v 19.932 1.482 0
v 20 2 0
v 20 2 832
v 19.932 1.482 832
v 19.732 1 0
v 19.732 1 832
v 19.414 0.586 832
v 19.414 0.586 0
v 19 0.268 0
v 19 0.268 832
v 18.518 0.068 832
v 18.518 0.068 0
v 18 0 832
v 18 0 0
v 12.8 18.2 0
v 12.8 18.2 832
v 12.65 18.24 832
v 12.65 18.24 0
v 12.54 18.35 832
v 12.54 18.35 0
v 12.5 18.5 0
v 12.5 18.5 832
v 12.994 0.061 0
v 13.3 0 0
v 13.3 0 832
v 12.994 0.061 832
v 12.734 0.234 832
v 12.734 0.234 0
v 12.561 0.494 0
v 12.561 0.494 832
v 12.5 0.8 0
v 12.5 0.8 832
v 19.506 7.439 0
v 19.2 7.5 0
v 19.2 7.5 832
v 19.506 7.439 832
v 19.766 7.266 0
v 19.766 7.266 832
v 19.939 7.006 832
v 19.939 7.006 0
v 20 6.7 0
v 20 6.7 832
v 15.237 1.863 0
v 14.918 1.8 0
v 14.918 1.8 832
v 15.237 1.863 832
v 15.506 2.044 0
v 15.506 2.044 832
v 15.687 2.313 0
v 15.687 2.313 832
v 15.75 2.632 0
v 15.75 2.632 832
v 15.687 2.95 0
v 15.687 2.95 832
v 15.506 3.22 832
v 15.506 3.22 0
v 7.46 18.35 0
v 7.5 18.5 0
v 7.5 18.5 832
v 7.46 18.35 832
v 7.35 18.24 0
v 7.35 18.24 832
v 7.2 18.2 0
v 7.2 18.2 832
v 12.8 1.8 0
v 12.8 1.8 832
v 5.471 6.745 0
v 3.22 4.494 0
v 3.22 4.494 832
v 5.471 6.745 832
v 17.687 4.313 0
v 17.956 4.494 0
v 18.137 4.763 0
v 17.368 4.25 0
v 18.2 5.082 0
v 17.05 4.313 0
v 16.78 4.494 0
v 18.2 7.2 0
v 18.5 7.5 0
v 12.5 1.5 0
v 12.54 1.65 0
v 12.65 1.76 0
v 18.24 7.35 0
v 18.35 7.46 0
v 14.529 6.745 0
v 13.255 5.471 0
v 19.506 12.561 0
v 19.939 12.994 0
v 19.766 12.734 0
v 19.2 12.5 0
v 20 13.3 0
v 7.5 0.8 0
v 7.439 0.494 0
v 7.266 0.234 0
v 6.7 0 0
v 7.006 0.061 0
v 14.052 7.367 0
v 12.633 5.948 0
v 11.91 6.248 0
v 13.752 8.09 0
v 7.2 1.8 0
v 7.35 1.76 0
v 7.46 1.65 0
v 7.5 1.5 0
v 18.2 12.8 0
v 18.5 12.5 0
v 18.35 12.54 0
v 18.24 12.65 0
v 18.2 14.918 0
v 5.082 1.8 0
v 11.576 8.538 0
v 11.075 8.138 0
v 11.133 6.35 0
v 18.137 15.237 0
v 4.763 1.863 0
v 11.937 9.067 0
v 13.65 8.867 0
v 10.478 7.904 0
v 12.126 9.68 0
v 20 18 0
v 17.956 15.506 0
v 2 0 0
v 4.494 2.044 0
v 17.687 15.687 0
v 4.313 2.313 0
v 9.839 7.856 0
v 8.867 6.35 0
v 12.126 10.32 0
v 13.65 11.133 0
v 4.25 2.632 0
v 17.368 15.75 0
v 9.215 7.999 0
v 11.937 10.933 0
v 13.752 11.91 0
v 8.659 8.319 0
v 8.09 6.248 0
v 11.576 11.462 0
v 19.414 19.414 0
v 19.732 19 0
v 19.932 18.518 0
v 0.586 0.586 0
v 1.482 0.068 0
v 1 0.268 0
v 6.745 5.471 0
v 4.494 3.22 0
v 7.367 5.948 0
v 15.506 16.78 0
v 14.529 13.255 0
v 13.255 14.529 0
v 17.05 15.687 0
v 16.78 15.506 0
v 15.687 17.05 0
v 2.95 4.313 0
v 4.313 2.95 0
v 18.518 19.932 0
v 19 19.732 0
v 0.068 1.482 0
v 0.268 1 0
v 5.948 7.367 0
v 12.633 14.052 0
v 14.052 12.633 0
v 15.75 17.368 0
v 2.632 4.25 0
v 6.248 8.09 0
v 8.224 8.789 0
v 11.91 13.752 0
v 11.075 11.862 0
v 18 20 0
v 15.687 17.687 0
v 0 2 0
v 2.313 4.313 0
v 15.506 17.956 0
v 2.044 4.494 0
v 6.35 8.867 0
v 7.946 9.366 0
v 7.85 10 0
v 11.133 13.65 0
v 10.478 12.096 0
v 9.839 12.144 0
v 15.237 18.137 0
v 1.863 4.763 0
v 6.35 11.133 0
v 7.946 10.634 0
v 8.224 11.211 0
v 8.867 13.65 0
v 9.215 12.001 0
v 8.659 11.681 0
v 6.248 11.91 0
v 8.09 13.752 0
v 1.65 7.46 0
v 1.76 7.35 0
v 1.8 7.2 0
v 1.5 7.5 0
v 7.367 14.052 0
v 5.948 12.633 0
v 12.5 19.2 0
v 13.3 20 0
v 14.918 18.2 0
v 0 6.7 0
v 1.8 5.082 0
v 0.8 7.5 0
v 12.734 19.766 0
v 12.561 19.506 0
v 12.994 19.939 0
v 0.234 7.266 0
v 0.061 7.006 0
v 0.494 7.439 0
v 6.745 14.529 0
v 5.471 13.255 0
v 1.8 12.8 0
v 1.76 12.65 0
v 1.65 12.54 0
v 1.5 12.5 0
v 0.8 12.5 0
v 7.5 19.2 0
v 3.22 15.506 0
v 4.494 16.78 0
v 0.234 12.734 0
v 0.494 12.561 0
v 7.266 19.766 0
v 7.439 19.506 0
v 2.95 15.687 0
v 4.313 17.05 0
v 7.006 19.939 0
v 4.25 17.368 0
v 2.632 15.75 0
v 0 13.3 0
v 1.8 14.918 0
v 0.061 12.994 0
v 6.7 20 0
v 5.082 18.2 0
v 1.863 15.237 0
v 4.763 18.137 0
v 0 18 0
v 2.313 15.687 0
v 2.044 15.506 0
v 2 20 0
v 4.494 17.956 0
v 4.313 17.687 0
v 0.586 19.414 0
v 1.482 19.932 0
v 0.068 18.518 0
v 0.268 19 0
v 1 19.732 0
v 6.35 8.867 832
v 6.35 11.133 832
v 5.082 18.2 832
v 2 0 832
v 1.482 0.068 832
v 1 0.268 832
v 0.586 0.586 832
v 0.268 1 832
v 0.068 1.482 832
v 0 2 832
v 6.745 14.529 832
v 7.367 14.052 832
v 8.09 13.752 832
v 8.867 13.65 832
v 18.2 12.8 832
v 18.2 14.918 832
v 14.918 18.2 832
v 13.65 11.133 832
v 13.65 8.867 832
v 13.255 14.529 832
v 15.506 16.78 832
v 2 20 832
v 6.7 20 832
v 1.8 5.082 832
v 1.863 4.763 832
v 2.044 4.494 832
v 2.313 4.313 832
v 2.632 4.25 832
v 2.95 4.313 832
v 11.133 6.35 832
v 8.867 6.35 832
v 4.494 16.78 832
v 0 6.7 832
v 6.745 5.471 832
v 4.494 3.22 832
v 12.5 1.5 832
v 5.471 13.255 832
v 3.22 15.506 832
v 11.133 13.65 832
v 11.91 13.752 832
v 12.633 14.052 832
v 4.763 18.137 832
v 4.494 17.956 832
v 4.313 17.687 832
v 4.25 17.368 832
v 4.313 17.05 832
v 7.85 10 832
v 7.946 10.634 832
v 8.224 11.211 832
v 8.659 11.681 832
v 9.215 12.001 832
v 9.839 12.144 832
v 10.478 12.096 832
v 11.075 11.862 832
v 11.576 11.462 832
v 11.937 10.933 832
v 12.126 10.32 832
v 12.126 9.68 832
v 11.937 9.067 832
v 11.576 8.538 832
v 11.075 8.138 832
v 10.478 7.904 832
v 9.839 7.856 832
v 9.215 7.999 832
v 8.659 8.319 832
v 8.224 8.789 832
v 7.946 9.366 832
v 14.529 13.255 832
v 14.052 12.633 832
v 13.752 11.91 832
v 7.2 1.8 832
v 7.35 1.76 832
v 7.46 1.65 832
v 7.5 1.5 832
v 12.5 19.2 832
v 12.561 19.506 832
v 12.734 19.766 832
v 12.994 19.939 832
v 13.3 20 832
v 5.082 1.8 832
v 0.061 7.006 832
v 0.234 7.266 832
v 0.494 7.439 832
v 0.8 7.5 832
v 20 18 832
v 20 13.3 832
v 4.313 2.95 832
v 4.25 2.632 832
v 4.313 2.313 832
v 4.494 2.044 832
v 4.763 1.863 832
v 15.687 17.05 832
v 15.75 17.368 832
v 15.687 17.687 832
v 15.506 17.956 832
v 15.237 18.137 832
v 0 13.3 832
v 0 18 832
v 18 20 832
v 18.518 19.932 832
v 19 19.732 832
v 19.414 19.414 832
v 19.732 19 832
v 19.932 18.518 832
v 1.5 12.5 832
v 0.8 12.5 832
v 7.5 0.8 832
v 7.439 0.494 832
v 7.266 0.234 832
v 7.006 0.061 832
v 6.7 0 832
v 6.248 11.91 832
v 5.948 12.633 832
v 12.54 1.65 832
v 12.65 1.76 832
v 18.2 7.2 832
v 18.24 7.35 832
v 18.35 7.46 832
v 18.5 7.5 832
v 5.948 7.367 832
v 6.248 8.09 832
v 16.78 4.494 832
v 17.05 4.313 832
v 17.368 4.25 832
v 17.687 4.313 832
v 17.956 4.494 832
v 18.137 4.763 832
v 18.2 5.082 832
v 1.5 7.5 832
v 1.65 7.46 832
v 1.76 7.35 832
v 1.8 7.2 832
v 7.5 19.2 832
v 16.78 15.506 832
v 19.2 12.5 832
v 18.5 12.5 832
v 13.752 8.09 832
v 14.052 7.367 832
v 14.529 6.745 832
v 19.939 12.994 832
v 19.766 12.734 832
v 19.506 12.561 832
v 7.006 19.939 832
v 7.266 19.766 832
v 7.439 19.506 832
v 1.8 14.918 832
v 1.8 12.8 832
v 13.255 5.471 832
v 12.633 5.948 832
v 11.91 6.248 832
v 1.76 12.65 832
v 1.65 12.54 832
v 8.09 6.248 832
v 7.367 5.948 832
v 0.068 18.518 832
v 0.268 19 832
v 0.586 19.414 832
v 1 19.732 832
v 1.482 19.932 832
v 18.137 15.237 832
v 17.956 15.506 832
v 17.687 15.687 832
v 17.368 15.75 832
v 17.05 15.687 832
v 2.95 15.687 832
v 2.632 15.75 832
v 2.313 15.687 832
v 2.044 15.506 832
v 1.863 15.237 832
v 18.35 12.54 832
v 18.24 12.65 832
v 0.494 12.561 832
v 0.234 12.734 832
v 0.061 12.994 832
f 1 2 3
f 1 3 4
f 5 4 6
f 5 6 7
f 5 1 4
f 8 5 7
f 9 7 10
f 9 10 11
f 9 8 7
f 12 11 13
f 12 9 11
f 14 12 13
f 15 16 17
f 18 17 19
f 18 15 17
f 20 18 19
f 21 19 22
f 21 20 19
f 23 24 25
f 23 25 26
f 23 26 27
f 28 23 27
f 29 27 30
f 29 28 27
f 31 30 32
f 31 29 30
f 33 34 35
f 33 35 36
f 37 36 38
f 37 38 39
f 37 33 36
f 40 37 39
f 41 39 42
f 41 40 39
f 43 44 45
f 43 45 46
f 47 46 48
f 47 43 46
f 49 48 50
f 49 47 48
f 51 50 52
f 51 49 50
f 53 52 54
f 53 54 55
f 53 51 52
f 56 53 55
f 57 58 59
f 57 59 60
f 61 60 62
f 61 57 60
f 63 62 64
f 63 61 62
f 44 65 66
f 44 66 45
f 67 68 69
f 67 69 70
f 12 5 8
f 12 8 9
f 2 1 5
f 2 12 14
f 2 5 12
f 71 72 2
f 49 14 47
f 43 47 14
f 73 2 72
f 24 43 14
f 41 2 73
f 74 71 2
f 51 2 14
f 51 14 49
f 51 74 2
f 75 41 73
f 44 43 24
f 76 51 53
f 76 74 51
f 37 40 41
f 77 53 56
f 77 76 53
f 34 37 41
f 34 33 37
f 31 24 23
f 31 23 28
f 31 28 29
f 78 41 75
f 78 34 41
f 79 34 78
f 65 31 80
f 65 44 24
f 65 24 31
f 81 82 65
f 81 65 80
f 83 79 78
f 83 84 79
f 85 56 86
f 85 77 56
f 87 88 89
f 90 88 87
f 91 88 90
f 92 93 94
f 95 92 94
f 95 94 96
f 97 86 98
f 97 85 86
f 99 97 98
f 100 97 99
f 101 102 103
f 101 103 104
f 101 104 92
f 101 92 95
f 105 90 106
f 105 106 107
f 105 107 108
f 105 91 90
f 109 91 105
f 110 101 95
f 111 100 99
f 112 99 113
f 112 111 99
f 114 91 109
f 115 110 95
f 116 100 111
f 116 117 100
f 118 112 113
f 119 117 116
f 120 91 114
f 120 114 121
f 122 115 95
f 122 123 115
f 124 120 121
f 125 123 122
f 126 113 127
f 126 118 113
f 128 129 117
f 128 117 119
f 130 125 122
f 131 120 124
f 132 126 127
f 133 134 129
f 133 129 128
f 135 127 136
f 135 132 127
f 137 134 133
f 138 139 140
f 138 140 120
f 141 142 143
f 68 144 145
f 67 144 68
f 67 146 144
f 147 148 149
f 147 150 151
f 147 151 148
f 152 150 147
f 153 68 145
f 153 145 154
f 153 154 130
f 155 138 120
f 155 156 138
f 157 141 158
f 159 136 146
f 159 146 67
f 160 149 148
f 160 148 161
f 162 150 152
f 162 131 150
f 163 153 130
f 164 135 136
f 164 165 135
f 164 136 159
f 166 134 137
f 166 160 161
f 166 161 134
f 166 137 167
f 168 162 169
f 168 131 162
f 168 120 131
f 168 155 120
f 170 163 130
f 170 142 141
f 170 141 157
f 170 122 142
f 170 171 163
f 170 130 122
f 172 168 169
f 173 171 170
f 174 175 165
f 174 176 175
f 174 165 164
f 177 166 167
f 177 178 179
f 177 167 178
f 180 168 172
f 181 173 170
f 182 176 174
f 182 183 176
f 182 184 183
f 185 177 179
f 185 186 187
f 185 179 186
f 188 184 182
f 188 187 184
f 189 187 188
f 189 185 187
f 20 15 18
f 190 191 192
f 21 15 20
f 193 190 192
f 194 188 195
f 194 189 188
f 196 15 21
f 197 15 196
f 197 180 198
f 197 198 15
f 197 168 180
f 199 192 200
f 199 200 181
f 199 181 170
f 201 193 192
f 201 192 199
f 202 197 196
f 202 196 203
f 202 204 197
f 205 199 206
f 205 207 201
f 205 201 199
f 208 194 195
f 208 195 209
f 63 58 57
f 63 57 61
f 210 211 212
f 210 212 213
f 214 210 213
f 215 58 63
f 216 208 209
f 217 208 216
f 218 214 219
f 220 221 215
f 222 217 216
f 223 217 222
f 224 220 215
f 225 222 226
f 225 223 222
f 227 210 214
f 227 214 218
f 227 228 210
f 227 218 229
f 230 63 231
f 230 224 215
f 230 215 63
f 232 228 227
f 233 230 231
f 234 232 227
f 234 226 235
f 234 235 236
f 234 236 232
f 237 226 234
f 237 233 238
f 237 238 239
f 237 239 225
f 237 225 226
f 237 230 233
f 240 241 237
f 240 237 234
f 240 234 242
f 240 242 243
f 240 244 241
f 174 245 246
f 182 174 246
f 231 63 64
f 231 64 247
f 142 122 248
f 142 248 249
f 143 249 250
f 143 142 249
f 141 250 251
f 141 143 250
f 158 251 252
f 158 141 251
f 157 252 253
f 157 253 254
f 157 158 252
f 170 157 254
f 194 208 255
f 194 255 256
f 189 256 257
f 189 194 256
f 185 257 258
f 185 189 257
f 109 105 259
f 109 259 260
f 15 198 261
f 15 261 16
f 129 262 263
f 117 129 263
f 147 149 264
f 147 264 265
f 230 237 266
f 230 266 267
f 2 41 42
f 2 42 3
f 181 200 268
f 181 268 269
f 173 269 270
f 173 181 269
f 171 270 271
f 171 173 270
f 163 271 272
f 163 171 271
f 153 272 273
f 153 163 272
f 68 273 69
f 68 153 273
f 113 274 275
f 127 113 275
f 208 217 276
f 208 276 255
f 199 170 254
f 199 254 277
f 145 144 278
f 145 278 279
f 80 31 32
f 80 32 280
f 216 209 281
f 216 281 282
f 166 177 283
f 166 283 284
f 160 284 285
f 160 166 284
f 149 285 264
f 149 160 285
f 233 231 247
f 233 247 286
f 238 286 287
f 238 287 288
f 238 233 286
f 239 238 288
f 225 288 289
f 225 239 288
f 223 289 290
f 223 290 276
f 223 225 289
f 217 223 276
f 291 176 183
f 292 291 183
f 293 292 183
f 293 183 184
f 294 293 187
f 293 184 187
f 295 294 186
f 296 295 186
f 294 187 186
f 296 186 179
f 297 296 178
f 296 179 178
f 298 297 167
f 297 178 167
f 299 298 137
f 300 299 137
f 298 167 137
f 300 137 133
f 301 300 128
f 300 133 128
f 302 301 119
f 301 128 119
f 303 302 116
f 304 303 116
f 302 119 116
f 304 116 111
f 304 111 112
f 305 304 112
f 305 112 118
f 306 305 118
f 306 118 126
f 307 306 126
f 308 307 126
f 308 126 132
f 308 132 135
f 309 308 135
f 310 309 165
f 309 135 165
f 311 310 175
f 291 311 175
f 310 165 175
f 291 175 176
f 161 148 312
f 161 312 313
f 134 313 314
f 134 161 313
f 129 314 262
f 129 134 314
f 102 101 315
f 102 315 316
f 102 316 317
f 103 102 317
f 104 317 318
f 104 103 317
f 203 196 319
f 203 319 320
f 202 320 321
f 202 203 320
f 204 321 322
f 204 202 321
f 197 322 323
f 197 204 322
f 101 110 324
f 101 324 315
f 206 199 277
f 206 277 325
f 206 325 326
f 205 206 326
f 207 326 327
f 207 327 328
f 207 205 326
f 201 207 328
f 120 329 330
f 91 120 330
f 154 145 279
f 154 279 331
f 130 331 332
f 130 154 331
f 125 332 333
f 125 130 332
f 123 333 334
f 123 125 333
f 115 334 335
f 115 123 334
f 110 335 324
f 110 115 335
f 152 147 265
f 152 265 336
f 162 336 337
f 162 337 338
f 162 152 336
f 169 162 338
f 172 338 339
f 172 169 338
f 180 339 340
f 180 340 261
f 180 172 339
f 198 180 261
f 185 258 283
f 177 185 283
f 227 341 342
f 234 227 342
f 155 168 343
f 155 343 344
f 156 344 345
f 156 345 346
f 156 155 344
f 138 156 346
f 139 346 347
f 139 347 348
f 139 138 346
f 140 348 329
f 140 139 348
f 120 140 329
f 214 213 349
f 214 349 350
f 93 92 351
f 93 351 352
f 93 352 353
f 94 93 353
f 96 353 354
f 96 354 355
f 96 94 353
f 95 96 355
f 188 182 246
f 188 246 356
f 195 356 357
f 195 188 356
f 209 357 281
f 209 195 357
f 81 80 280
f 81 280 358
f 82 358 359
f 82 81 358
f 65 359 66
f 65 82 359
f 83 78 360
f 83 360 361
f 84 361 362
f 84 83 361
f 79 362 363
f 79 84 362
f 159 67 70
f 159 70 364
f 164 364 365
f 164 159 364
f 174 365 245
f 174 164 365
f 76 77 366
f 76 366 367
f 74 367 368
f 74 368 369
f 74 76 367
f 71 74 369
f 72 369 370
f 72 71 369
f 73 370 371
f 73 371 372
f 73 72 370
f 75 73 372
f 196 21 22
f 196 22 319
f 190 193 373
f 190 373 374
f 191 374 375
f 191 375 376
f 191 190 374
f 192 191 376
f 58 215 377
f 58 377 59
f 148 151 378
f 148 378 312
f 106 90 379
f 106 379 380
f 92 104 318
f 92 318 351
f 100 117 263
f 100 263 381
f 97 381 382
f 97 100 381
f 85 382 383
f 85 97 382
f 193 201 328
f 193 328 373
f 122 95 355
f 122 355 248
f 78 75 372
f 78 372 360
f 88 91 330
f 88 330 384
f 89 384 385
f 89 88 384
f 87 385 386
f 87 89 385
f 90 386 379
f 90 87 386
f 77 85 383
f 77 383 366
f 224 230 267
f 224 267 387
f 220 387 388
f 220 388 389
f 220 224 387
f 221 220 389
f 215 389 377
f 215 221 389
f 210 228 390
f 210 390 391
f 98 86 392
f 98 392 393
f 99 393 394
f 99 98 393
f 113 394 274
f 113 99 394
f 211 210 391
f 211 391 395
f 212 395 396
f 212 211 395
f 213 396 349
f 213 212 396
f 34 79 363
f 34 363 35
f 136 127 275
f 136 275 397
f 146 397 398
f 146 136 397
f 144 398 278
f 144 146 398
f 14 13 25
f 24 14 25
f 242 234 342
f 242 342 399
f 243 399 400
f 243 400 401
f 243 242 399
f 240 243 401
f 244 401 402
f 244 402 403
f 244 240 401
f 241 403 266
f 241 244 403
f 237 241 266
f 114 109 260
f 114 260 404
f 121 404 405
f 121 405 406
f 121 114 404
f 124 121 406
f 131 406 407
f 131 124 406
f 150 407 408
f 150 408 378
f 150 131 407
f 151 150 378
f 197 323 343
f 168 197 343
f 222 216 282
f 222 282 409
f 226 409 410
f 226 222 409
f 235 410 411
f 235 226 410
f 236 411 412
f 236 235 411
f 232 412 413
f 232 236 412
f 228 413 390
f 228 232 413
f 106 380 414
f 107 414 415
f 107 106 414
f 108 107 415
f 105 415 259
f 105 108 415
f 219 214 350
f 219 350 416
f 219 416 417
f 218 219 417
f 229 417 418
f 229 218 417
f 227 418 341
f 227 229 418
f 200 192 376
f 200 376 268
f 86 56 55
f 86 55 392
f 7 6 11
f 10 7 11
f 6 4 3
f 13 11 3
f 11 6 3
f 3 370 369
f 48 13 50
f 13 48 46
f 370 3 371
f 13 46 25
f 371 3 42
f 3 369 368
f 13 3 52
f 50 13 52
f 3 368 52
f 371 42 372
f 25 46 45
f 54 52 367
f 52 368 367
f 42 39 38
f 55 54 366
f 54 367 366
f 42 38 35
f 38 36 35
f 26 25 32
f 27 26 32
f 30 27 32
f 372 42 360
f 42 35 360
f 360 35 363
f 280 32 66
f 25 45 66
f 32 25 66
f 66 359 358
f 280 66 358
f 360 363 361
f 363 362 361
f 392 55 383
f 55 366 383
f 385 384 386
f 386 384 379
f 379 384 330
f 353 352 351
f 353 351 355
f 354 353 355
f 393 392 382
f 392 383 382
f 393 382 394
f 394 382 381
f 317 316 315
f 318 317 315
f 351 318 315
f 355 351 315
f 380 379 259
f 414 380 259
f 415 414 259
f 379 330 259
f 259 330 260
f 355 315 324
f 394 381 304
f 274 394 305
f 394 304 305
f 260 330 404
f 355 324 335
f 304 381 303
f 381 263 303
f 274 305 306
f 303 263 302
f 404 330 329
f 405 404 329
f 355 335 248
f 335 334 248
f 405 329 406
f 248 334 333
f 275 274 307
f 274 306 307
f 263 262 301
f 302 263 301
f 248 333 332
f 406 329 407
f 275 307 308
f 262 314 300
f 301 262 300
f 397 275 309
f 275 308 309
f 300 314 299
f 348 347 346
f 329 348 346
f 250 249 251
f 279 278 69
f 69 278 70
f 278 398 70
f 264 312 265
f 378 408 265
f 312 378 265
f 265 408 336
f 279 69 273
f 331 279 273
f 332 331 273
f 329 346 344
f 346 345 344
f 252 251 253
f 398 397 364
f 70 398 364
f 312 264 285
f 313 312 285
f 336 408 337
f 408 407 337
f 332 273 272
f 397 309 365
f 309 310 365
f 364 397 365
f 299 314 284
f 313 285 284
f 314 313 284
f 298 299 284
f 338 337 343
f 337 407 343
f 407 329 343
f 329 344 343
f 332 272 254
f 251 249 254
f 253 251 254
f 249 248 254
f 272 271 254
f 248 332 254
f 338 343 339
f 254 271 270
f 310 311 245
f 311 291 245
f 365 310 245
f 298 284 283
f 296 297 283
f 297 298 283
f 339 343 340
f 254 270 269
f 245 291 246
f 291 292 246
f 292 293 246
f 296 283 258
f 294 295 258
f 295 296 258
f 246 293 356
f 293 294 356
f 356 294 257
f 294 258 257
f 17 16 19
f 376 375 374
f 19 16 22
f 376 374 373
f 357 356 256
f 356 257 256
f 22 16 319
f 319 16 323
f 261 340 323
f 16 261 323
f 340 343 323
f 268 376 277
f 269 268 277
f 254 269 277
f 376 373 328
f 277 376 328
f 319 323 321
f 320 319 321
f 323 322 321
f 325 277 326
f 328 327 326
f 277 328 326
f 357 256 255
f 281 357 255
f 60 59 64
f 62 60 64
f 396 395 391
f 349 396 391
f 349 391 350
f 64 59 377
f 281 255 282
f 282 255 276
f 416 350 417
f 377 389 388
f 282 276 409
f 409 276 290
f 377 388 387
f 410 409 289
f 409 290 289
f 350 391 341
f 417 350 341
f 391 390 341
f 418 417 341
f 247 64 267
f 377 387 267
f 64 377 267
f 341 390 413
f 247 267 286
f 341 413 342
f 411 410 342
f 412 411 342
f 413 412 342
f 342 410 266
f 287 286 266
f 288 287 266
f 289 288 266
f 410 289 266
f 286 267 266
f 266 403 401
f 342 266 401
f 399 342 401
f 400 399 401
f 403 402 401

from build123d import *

# Parameters (mm, degrees)
ESQUISSE1_R        = 2.15
BOSS_EXTRU_1_DEPTH = 832


with BuildPart() as part:
    # Esquisse1 → Boss.-Extru.1 (new body)
    with BuildSketch(Plane(origin=(0, 0, 0), x_dir=(-1, 0, 0), z_dir=(0, 0, -1))):
        with BuildLine():
            Line((-20, 6.7), (-20, 2))
            ThreePointArc((-20, 2), (-19.414213562, 0.585786438), (-18, 0))
            Line((-18, 0), (-13.3, 0))
            ThreePointArc((-13.3, 0), (-12.734314575, 0.234314575), (-12.5, 0.8))
            Line((-12.5, 0.8), (-12.5, 1.5))
            ThreePointArc((-12.5, 1.5), (-12.587867966, 1.712132034), (-12.8, 1.8))
            Line((-12.8, 1.8), (-14.918424061, 1.8))
            ThreePointArc((-14.918424061, 1.8), (-15.686700051, 2.313345604), (-15.506437047, 3.219588924))
            Line((-15.506437047, 3.219588924), (-13.254705627, 5.471320344))
            ThreePointArc((-13.254705627, 5.471320344), (-12.281435581, 6.121638598), (-11.133385284, 6.35))
            Line((-11.133385284, 6.35), (-8.866614716, 6.35))
            ThreePointArc((-8.866614716, 6.35), (-7.718564419, 6.121638598), (-6.745294373, 5.471320344))
            Line((-6.745294373, 5.471320344), (-4.493562953, 3.219588924))
            ThreePointArc((-4.493562953, 3.219588924), (-4.313299949, 2.313345604), (-5.081575939, 1.8))
            Line((-5.081575939, 1.8), (-7.2, 1.8))
            ThreePointArc((-7.2, 1.8), (-7.412132034, 1.712132034), (-7.5, 1.5))
            Line((-7.5, 1.5), (-7.5, 0.8))
            ThreePointArc((-7.5, 0.8), (-7.265685425, 0.234314575), (-6.7, 0))
            Line((-6.7, 0), (-2, 0))
            ThreePointArc((-2, 0), (-0.585786438, 0.585786438), (0, 2))
            Line((0, 2), (0, 6.7))
            ThreePointArc((0, 6.7), (-0.234314575, 7.265685425), (-0.8, 7.5))
            Line((-0.8, 7.5), (-1.5, 7.5))
            ThreePointArc((-1.5, 7.5), (-1.712132034, 7.412132034), (-1.8, 7.2))
            Line((-1.8, 7.2), (-1.8, 5.081575939))
            ThreePointArc((-1.8, 5.081575939), (-2.313345604, 4.313299949), (-3.219588924, 4.493562953))
            Line((-3.219588924, 4.493562953), (-5.471320344, 6.745294373))
            ThreePointArc((-5.471320344, 6.745294373), (-6.121638598, 7.718564419), (-6.35, 8.866614716))
            Line((-6.35, 8.866614716), (-6.35, 11.133385284))
            ThreePointArc((-6.35, 11.133385284), (-6.121638598, 12.281435581), (-5.471320344, 13.254705627))
            Line((-5.471320344, 13.254705627), (-3.219588924, 15.506437047))
            ThreePointArc((-3.219588924, 15.506437047), (-2.313345604, 15.686700051), (-1.8, 14.918424061))
            Line((-1.8, 14.918424061), (-1.8, 12.8))
            ThreePointArc((-1.8, 12.8), (-1.712132034, 12.587867966), (-1.5, 12.5))
            Line((-1.5, 12.5), (-0.8, 12.5))
            ThreePointArc((-0.8, 12.5), (-0.234314575, 12.734314575), (0, 13.3))
            Line((0, 13.3), (0, 18))
            ThreePointArc((0, 18), (-0.585786438, 19.414213562), (-2, 20))
            Line((-2, 20), (-6.7, 20))
            ThreePointArc((-6.7, 20), (-7.265685425, 19.765685425), (-7.5, 19.2))
            Line((-7.5, 19.2), (-7.5, 18.5))
            ThreePointArc((-7.5, 18.5), (-7.412132034, 18.287867966), (-7.2, 18.2))
            Line((-7.2, 18.2), (-5.081575939, 18.2))
            ThreePointArc((-5.081575939, 18.2), (-4.313299949, 17.686654396), (-4.493562953, 16.780411076))
            Line((-4.493562953, 16.780411076), (-6.745294373, 14.528679656))
            ThreePointArc((-6.745294373, 14.528679656), (-7.718564419, 13.878361402), (-8.866614716, 13.65))
            Line((-8.866614716, 13.65), (-11.133385284, 13.65))
            ThreePointArc((-11.133385284, 13.65), (-12.281435581, 13.878361402), (-13.254705627, 14.528679656))
            Line((-13.254705627, 14.528679656), (-15.506437047, 16.780411076))
            ThreePointArc((-15.506437047, 16.780411076), (-15.686700051, 17.686654396), (-14.918424061, 18.2))
            Line((-14.918424061, 18.2), (-12.8, 18.2))
            ThreePointArc((-12.8, 18.2), (-12.587867966, 18.287867966), (-12.5, 18.5))
            Line((-12.5, 18.5), (-12.5, 19.2))
            ThreePointArc((-12.5, 19.2), (-12.734314575, 19.765685425), (-13.3, 20))
            Line((-13.3, 20), (-18, 20))
            ThreePointArc((-18, 20), (-19.414213562, 19.414213562), (-20, 18))
            Line((-20, 18), (-20, 13.3))
            ThreePointArc((-20, 13.3), (-19.765685425, 12.734314575), (-19.2, 12.5))
            Line((-19.2, 12.5), (-18.5, 12.5))
            ThreePointArc((-18.5, 12.5), (-18.287867966, 12.587867966), (-18.2, 12.8))
            Line((-18.2, 12.8), (-18.2, 14.918424061))
            ThreePointArc((-18.2, 14.918424061), (-17.686654396, 15.686700051), (-16.780411076, 15.506437047))
            Line((-16.780411076, 15.506437047), (-14.528679656, 13.254705627))
            ThreePointArc((-14.528679656, 13.254705627), (-13.878361402, 12.281435581), (-13.65, 11.133385284))
            Line((-13.65, 11.133385284), (-13.65, 8.866614716))
            ThreePointArc((-13.65, 8.866614716), (-13.878361402, 7.718564419), (-14.528679656, 6.745294373))
            Line((-14.528679656, 6.745294373), (-16.780411076, 4.493562953))
            ThreePointArc((-16.780411076, 4.493562953), (-17.686654396, 4.313299949), (-18.2, 5.081575939))
            Line((-18.2, 5.081575939), (-18.2, 7.2))
            ThreePointArc((-18.2, 7.2), (-18.287867966, 7.412132034), (-18.5, 7.5))
            Line((-18.5, 7.5), (-19.2, 7.5))
            ThreePointArc((-19.2, 7.5), (-19.765685425, 7.265685425), (-20, 6.7))
        make_face()
        with Locations((-10, 10)):
            Circle(ESQUISSE1_R, mode=Mode.SUBTRACT)
    extrude(amount=-BOSS_EXTRU_1_DEPTH)


solid = part.part
